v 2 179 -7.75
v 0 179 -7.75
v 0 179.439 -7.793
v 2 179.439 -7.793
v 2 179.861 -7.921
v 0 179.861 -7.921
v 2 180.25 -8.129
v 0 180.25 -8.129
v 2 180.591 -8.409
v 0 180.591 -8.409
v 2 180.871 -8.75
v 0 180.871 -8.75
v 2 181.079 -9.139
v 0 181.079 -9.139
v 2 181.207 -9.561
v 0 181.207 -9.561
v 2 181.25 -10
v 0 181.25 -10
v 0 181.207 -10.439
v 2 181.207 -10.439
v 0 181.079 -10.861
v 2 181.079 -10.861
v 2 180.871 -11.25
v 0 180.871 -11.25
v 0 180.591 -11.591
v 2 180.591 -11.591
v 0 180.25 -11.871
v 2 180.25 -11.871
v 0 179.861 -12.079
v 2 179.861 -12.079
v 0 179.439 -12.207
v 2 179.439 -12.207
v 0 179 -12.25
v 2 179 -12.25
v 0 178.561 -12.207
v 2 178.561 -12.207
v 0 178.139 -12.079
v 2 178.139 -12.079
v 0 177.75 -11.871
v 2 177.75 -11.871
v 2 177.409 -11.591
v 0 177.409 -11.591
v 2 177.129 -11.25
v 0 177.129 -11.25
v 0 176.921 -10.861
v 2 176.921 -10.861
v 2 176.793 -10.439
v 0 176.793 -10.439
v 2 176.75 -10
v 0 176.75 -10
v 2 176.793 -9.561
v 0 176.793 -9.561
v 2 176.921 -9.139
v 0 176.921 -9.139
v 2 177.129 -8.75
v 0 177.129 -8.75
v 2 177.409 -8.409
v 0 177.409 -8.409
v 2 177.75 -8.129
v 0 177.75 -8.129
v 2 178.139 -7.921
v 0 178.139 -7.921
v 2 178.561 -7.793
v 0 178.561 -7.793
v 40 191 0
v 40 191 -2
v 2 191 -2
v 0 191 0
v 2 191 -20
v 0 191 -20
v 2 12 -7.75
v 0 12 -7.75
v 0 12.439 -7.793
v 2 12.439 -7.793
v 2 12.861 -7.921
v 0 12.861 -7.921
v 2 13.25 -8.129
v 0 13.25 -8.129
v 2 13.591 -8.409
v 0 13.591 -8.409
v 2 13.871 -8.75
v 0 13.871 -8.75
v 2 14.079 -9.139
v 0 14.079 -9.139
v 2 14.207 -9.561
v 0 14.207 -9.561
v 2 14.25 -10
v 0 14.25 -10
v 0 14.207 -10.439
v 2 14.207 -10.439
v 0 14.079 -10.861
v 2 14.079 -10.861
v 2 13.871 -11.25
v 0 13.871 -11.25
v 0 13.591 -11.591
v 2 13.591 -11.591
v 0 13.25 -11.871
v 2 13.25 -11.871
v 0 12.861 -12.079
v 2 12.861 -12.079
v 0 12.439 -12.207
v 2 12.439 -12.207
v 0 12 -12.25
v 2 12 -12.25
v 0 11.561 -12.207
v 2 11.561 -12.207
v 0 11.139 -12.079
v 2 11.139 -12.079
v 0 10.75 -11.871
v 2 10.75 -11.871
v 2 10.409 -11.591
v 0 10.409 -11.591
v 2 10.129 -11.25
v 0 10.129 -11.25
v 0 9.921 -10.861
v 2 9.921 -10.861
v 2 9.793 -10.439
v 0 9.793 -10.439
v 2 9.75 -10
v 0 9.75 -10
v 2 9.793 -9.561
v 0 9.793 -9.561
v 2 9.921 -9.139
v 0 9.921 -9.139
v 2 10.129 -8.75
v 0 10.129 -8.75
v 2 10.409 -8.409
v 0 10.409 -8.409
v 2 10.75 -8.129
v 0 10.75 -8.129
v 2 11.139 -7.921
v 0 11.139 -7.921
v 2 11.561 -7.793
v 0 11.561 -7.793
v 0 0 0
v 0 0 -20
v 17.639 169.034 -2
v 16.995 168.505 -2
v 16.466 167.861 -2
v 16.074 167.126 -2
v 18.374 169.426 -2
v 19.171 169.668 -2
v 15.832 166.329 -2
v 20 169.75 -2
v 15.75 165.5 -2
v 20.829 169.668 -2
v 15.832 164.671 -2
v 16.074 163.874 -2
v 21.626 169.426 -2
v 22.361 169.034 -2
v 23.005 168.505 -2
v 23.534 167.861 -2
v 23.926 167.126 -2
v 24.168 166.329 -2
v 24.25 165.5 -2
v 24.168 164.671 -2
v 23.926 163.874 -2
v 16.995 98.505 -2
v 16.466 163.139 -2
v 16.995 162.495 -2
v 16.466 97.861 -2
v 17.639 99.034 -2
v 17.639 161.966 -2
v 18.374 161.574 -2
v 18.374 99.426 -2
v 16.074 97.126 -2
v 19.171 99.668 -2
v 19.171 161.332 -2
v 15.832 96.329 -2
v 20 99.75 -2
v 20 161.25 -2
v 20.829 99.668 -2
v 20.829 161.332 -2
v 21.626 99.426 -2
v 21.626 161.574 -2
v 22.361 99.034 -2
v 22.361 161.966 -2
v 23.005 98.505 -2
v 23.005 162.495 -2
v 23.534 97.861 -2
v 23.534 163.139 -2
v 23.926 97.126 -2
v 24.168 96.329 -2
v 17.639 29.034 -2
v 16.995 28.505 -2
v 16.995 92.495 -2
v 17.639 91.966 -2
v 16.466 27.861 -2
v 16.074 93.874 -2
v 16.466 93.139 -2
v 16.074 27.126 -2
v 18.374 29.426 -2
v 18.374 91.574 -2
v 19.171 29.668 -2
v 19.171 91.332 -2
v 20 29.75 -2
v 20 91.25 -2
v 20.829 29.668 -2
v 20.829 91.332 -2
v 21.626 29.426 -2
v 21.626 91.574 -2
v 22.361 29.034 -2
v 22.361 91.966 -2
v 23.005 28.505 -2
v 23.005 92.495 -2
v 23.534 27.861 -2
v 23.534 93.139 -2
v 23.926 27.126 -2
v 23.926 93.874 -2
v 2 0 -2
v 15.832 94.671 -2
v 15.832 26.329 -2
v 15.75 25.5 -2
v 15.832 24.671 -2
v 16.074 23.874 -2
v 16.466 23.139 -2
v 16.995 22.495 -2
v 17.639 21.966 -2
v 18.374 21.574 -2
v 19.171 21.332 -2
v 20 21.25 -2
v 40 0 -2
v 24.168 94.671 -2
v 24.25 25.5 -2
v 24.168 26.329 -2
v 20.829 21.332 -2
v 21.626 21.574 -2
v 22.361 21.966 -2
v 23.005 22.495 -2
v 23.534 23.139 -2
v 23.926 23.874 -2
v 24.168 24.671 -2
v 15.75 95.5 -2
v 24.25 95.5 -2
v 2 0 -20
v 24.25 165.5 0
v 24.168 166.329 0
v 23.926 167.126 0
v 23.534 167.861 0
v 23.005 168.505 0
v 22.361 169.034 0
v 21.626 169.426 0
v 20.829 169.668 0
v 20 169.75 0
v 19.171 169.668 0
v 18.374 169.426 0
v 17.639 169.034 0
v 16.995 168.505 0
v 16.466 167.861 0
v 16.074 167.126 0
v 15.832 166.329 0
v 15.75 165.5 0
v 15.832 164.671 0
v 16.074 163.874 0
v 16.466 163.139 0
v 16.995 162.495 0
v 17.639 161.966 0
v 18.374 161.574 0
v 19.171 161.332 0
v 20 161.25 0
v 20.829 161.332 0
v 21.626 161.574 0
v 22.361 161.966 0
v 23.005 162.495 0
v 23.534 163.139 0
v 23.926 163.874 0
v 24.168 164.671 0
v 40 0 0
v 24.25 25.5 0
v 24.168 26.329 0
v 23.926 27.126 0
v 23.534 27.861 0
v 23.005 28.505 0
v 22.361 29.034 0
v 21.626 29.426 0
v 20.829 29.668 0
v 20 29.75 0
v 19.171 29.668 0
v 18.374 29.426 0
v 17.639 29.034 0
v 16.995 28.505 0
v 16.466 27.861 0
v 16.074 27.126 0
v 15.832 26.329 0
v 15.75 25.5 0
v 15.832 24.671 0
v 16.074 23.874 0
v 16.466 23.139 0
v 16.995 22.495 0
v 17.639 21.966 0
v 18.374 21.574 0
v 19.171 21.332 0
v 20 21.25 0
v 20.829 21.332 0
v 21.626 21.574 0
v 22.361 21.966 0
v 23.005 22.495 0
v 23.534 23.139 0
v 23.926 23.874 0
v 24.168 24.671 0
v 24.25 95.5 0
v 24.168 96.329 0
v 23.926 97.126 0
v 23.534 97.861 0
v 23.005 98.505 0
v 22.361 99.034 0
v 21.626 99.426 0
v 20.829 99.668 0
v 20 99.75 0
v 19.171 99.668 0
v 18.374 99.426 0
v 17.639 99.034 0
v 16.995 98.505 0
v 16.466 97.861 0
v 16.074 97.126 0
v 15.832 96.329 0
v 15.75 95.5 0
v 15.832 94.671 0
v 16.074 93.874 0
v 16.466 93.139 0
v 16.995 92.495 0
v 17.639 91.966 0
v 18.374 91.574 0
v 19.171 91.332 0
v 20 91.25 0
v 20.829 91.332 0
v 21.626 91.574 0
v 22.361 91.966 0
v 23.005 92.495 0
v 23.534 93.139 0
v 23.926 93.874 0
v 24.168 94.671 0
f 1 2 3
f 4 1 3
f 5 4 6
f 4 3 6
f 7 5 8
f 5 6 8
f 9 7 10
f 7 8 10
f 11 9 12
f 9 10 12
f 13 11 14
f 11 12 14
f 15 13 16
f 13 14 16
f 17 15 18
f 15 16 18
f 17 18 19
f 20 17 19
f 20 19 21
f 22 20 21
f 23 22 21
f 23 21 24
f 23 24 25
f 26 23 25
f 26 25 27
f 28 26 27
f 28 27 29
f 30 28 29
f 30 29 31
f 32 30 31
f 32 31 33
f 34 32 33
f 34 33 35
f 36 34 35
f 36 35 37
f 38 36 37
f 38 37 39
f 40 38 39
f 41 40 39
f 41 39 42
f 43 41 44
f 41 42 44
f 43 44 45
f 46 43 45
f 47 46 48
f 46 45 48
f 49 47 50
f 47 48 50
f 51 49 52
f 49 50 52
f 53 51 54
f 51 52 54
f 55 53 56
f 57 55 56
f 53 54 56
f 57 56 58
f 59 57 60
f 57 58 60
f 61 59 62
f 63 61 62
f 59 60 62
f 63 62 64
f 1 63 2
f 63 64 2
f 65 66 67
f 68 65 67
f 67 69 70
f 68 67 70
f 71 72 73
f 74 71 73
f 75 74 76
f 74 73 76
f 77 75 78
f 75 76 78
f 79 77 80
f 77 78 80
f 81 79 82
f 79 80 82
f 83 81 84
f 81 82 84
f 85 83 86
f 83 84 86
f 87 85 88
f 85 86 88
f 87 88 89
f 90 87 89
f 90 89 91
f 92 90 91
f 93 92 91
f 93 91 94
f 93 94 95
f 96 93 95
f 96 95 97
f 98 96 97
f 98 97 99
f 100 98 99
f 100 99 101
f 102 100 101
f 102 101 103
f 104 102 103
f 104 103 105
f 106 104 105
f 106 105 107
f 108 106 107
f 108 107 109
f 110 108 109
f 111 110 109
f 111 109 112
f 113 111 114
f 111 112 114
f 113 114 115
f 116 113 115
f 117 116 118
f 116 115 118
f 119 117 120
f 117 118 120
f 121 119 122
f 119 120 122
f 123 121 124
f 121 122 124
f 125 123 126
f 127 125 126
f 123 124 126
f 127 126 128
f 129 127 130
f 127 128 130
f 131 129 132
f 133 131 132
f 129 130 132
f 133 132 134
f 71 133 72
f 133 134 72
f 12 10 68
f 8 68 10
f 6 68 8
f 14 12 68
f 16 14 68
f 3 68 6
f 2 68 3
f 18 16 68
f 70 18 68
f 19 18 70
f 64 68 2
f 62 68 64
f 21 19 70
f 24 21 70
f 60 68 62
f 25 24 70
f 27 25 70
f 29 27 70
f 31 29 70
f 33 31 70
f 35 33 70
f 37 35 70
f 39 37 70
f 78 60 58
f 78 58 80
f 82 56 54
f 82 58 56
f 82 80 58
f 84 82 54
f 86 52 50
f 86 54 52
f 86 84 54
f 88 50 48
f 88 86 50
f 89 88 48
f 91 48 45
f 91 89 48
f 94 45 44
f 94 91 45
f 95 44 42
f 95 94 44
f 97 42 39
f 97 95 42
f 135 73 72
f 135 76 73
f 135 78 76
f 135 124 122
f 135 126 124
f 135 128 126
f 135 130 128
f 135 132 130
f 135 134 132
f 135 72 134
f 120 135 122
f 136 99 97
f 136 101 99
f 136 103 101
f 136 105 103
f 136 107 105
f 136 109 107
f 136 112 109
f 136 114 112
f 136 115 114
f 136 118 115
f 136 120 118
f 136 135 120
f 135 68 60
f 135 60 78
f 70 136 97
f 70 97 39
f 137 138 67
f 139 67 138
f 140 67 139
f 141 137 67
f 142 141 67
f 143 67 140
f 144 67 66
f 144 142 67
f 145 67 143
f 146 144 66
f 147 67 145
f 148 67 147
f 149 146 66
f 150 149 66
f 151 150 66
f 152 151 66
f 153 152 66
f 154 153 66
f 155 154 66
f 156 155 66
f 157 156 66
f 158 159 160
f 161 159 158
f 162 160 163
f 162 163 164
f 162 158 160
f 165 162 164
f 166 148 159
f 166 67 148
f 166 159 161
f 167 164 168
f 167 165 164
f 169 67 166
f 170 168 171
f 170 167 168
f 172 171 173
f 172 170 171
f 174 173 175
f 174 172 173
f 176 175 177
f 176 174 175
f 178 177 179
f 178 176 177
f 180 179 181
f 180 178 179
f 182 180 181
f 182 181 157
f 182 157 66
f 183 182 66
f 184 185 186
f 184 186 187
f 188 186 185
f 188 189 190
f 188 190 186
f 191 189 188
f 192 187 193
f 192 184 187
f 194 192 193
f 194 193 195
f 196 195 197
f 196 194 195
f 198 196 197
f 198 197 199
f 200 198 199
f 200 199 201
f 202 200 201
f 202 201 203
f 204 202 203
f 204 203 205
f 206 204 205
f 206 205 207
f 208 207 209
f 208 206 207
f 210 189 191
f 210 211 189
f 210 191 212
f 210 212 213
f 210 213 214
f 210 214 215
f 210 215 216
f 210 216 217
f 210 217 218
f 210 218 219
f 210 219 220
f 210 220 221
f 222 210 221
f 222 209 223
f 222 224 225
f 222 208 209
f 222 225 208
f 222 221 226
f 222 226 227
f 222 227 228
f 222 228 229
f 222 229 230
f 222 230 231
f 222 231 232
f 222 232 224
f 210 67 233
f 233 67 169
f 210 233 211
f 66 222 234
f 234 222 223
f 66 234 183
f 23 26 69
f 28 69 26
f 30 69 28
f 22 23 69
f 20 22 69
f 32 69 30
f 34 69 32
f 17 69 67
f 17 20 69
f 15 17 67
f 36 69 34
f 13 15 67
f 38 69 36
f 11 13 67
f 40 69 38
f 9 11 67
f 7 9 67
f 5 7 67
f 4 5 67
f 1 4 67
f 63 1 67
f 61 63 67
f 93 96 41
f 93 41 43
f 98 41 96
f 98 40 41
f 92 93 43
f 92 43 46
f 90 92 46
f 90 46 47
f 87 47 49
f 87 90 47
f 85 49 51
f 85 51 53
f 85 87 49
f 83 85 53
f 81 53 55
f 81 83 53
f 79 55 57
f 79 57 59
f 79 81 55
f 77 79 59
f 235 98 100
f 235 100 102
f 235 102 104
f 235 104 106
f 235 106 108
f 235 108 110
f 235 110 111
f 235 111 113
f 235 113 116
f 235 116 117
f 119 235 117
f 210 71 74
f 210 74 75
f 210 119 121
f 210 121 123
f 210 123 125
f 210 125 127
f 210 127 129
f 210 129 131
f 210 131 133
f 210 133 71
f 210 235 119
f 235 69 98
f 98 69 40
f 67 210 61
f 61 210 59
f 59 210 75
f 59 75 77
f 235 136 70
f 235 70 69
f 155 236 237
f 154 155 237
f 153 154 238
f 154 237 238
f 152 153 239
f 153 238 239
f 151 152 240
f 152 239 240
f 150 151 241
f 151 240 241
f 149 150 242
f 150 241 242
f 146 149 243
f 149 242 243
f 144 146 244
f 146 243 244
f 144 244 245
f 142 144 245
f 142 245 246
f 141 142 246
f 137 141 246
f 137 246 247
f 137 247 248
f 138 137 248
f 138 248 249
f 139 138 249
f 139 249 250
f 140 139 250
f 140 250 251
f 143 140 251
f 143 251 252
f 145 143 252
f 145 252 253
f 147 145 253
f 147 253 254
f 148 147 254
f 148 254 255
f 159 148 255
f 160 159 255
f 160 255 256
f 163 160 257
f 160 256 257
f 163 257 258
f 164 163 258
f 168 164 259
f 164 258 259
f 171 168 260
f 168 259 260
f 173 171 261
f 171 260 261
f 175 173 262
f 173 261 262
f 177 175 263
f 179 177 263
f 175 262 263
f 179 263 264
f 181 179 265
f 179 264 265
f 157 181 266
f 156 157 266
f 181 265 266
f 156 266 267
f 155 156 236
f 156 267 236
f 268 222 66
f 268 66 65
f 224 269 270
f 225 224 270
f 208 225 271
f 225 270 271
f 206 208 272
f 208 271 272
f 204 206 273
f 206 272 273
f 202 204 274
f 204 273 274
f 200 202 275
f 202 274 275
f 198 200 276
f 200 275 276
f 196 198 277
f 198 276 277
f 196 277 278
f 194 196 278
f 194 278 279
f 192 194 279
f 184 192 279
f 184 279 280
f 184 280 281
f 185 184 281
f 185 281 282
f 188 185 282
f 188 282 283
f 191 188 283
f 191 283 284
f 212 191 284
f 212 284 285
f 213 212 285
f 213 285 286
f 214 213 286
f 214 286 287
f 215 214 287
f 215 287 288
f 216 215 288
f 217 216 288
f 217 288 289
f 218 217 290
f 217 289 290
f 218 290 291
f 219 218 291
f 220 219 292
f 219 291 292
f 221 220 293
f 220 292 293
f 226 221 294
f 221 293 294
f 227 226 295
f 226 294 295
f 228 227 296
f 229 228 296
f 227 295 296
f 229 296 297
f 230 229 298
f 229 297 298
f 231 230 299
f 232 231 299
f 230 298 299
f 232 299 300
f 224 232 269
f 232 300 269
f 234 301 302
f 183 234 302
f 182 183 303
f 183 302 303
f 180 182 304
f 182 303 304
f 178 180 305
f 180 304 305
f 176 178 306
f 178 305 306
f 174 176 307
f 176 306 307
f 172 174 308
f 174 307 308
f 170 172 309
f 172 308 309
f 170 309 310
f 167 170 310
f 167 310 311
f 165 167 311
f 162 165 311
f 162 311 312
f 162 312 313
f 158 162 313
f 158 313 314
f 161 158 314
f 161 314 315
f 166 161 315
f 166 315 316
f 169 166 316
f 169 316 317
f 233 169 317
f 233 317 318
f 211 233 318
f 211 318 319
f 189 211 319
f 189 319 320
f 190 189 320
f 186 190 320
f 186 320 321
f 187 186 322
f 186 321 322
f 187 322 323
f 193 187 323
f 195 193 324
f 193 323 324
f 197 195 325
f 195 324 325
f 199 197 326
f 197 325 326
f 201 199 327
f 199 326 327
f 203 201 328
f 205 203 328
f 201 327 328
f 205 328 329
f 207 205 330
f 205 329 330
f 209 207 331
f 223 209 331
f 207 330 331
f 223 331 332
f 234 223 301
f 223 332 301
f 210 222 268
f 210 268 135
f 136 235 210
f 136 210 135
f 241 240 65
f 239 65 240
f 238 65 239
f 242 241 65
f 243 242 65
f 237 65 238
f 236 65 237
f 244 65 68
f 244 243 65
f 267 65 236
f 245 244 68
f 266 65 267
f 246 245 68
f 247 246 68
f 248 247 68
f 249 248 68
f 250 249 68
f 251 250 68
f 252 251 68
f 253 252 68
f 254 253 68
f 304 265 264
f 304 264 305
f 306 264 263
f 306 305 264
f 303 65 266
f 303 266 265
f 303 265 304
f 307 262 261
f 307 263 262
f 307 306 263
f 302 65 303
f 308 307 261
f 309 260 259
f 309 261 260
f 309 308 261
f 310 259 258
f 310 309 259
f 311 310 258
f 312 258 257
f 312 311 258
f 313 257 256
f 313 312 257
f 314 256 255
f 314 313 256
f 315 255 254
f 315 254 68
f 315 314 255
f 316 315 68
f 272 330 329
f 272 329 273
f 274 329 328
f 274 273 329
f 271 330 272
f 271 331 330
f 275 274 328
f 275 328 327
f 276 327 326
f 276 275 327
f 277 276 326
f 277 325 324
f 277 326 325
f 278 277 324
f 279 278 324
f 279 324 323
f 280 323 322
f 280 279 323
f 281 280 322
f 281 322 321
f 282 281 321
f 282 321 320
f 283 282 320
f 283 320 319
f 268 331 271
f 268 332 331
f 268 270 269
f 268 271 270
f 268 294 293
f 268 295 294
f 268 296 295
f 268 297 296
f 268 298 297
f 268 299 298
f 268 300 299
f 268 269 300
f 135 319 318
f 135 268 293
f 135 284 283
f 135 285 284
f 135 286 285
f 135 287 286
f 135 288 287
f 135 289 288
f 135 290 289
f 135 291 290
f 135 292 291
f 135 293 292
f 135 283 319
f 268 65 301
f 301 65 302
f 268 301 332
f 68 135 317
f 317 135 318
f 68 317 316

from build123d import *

# Parameters (mm, degrees)
EXTRUDE_1_DEPTH     = 191
SKETCH_2_R          = 4.25
CUT_EXTRUDE_1_DEPTH = 21
SKETCH_3_R          = 2.25
CUT_EXTRUDE_2_DEPTH = 41


with BuildPart() as part:
    # Эскиз1 → Бобышка-Вытянуть1 (new body)
    with BuildSketch(Plane(origin=(0, 0, 0), x_dir=(1, 0, 0), z_dir=(0, 1, 0))):
        Polygon((0, 0), (0, 20), (2, 20), (2, 2), (40, 2), (40, 0), align=None)
    extrude(amount=EXTRUDE_1_DEPTH)

    # Эскиз2 → Вырез-Вытянуть1 (cut, through all)
    with BuildSketch(Plane.XY):
        with Locations((20, 165.5)):
            Circle(SKETCH_2_R)
        with Locations((20, 95.5)):
            Circle(SKETCH_2_R)
        with Locations((20, 25.5)):
            Circle(SKETCH_2_R)
    extrude(amount=-CUT_EXTRUDE_1_DEPTH, mode=Mode.SUBTRACT)

    # Эскиз3 → Вырез-Вытянуть2 (cut, through all)
    with BuildSketch(Plane.ZY):
        with Locations((-10, 12)):
            Circle(SKETCH_3_R)
        with Locations((-10, 179)):
            Circle(SKETCH_3_R)
    extrude(amount=-CUT_EXTRUDE_2_DEPTH, mode=Mode.SUBTRACT)


solid = part.part
